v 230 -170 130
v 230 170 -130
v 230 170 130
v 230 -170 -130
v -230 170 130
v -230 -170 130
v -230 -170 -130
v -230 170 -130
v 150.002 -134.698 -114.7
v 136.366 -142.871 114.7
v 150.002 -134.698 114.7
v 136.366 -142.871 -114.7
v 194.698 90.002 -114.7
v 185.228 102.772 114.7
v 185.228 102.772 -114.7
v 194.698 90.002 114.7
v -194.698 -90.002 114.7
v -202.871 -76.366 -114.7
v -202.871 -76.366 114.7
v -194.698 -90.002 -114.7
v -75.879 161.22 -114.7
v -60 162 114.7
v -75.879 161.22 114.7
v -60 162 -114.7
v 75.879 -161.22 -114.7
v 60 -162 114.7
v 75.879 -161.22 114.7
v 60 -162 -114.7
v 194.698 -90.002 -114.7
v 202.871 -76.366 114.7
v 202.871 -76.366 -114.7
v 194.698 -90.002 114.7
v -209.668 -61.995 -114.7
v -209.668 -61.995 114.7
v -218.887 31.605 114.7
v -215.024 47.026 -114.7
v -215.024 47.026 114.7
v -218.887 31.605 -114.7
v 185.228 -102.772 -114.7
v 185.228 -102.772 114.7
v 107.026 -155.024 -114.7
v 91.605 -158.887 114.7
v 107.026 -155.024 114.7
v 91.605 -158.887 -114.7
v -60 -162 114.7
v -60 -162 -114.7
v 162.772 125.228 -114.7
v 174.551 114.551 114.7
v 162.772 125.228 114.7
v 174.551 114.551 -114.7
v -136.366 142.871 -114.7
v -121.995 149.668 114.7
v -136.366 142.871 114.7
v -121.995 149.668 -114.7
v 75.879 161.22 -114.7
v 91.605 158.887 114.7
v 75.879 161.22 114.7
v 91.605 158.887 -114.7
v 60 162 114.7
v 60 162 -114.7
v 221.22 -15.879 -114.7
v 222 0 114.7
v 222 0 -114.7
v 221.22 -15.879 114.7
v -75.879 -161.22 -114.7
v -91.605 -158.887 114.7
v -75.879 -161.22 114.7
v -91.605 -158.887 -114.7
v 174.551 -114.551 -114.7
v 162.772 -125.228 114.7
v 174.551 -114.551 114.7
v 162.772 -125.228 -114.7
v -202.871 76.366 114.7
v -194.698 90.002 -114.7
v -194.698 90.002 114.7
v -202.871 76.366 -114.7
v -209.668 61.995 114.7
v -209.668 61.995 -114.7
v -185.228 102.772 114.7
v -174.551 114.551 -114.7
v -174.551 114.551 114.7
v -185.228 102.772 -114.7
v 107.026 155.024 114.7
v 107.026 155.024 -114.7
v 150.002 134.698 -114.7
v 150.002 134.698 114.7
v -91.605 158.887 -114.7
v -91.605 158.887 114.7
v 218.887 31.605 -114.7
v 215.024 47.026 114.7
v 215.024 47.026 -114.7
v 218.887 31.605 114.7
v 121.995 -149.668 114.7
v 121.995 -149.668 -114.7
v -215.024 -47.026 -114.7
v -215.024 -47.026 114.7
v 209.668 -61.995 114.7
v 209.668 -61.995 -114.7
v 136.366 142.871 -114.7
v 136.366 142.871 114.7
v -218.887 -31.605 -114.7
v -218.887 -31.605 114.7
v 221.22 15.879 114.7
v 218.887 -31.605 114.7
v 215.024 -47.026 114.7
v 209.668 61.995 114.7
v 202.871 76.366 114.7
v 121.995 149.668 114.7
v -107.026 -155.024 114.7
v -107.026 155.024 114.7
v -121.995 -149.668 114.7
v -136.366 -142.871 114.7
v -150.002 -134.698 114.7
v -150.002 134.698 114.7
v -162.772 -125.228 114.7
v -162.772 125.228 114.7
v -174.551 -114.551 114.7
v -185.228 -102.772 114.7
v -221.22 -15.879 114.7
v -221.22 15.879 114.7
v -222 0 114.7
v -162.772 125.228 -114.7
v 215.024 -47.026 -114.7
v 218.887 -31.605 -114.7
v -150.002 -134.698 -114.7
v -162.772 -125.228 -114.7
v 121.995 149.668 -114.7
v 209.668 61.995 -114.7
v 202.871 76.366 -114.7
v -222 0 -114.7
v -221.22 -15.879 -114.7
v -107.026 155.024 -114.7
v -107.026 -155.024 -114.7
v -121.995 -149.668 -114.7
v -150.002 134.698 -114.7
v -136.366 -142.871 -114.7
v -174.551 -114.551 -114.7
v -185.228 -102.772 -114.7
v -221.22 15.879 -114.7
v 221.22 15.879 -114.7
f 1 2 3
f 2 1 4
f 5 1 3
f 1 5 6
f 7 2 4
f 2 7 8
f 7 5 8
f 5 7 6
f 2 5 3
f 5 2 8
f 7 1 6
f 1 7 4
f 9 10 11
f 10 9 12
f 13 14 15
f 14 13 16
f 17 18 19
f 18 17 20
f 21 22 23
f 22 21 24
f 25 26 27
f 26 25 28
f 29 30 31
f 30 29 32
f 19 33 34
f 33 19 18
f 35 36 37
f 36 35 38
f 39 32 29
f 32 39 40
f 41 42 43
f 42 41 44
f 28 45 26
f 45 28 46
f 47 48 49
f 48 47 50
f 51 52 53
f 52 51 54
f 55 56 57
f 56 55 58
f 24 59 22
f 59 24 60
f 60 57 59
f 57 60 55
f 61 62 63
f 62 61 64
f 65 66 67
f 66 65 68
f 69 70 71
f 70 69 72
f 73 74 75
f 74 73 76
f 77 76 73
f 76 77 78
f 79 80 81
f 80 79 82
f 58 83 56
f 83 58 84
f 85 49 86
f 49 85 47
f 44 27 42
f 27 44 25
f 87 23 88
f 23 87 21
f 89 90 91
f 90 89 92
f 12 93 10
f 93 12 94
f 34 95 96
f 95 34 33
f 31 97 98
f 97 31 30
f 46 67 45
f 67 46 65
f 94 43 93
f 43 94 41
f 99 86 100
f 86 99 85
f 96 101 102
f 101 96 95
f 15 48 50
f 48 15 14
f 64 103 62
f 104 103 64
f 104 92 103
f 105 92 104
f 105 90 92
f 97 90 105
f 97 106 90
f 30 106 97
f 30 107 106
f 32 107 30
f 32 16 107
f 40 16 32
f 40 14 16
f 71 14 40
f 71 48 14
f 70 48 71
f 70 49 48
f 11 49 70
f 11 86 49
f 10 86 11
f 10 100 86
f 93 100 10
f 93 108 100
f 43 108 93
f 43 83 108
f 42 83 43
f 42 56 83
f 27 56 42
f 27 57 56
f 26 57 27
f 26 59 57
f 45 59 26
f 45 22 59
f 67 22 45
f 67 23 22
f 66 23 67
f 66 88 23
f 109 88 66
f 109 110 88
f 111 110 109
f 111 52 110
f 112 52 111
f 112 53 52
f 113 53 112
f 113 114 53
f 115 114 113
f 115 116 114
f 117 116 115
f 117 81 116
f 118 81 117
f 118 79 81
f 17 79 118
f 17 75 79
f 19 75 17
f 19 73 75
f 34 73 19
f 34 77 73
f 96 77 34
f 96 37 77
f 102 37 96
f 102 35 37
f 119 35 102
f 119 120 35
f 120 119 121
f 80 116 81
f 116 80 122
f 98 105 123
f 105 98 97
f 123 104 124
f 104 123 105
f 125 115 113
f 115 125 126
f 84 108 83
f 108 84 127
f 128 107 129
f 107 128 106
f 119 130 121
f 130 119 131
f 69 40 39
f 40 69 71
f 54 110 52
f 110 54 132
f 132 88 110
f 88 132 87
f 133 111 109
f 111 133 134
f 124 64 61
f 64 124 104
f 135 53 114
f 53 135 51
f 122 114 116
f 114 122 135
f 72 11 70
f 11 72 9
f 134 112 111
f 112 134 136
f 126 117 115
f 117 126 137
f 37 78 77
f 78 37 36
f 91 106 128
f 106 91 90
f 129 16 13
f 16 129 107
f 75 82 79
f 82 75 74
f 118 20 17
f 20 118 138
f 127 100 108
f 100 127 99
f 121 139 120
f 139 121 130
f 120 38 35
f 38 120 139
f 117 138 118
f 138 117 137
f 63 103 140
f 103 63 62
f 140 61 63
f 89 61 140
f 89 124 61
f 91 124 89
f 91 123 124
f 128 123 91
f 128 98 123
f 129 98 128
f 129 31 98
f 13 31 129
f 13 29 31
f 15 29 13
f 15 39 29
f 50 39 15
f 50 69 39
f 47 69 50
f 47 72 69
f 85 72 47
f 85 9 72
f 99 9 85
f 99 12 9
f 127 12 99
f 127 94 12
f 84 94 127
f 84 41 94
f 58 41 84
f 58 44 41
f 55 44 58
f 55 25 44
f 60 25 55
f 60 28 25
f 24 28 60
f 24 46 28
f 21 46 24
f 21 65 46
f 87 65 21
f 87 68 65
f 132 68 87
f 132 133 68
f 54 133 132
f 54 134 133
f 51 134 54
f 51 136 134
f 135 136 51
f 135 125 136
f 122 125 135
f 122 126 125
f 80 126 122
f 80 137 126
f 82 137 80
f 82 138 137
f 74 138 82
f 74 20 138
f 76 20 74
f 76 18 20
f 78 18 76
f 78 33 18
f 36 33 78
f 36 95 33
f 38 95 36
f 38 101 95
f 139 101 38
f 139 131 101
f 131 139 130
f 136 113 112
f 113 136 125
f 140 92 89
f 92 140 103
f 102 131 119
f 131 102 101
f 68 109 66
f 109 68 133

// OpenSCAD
// ============================================================================
// Atom Lithography Machine — Parametric OpenSCAD Module (S9.3-03)
// ============================================================================
// part_id           : S9.3-03
// parent_bom_id     : S9.3
// subsystem         : S9
// part_name         : Pulse-tube adsorber, scroll pompa tip-seal ve kriyo conta servis kiti
// material          : PTFE
// temp_stage        : 300 K / 4 K
// vacuum_grade      : Kriyo/Vakum
// tolerance         : ISO 2768-mK
// computed_mass_kg  : 18.00000
// envelope_mm       : 488.800 x 356.400 x 260.000
// design_maturity   : M0_M1_DETAILED_CAD_DESIGN_ONLY
// no_lab_measurement: true
// iec61508_certified: false
// semi_s2_certified : false
// Units: millimeters (mm)
// ============================================================================

$fn = 64;

// Nominal bounding envelope parameters (mm)
bbox_x = 488.8000;
bbox_y = 356.4000;
bbox_z = 260.0000;

// Part-specific parametric dimensions
chest_dx_mm = 460.0;
chest_dy_mm = 340.0;
chest_dz_mm = 260.0;

// Interface / port parameters (mm)

module part_S9_3_03() {
  difference() {
    union() {
      // Cleanroom ESD storage case outer envelope
      cube([460.000, 340.000, 260.000], center=true);
    }
    // Internal padded kit tray cavity
    hull() {
      translate([-60.000, 0, 0]) cylinder(d=324.000, h=229.400, center=true);
      translate([60.000, 0, 0]) cylinder(d=324.000, h=229.400, center=true);
    }
  }
}

// World assembly mounting transform (global machine frame, mm / deg):
// translate([780.000, -1520.000, 130.000]) rotate([0.000, 0.000, 0.000]) part_S9_3_03();

part_S9_3_03();
